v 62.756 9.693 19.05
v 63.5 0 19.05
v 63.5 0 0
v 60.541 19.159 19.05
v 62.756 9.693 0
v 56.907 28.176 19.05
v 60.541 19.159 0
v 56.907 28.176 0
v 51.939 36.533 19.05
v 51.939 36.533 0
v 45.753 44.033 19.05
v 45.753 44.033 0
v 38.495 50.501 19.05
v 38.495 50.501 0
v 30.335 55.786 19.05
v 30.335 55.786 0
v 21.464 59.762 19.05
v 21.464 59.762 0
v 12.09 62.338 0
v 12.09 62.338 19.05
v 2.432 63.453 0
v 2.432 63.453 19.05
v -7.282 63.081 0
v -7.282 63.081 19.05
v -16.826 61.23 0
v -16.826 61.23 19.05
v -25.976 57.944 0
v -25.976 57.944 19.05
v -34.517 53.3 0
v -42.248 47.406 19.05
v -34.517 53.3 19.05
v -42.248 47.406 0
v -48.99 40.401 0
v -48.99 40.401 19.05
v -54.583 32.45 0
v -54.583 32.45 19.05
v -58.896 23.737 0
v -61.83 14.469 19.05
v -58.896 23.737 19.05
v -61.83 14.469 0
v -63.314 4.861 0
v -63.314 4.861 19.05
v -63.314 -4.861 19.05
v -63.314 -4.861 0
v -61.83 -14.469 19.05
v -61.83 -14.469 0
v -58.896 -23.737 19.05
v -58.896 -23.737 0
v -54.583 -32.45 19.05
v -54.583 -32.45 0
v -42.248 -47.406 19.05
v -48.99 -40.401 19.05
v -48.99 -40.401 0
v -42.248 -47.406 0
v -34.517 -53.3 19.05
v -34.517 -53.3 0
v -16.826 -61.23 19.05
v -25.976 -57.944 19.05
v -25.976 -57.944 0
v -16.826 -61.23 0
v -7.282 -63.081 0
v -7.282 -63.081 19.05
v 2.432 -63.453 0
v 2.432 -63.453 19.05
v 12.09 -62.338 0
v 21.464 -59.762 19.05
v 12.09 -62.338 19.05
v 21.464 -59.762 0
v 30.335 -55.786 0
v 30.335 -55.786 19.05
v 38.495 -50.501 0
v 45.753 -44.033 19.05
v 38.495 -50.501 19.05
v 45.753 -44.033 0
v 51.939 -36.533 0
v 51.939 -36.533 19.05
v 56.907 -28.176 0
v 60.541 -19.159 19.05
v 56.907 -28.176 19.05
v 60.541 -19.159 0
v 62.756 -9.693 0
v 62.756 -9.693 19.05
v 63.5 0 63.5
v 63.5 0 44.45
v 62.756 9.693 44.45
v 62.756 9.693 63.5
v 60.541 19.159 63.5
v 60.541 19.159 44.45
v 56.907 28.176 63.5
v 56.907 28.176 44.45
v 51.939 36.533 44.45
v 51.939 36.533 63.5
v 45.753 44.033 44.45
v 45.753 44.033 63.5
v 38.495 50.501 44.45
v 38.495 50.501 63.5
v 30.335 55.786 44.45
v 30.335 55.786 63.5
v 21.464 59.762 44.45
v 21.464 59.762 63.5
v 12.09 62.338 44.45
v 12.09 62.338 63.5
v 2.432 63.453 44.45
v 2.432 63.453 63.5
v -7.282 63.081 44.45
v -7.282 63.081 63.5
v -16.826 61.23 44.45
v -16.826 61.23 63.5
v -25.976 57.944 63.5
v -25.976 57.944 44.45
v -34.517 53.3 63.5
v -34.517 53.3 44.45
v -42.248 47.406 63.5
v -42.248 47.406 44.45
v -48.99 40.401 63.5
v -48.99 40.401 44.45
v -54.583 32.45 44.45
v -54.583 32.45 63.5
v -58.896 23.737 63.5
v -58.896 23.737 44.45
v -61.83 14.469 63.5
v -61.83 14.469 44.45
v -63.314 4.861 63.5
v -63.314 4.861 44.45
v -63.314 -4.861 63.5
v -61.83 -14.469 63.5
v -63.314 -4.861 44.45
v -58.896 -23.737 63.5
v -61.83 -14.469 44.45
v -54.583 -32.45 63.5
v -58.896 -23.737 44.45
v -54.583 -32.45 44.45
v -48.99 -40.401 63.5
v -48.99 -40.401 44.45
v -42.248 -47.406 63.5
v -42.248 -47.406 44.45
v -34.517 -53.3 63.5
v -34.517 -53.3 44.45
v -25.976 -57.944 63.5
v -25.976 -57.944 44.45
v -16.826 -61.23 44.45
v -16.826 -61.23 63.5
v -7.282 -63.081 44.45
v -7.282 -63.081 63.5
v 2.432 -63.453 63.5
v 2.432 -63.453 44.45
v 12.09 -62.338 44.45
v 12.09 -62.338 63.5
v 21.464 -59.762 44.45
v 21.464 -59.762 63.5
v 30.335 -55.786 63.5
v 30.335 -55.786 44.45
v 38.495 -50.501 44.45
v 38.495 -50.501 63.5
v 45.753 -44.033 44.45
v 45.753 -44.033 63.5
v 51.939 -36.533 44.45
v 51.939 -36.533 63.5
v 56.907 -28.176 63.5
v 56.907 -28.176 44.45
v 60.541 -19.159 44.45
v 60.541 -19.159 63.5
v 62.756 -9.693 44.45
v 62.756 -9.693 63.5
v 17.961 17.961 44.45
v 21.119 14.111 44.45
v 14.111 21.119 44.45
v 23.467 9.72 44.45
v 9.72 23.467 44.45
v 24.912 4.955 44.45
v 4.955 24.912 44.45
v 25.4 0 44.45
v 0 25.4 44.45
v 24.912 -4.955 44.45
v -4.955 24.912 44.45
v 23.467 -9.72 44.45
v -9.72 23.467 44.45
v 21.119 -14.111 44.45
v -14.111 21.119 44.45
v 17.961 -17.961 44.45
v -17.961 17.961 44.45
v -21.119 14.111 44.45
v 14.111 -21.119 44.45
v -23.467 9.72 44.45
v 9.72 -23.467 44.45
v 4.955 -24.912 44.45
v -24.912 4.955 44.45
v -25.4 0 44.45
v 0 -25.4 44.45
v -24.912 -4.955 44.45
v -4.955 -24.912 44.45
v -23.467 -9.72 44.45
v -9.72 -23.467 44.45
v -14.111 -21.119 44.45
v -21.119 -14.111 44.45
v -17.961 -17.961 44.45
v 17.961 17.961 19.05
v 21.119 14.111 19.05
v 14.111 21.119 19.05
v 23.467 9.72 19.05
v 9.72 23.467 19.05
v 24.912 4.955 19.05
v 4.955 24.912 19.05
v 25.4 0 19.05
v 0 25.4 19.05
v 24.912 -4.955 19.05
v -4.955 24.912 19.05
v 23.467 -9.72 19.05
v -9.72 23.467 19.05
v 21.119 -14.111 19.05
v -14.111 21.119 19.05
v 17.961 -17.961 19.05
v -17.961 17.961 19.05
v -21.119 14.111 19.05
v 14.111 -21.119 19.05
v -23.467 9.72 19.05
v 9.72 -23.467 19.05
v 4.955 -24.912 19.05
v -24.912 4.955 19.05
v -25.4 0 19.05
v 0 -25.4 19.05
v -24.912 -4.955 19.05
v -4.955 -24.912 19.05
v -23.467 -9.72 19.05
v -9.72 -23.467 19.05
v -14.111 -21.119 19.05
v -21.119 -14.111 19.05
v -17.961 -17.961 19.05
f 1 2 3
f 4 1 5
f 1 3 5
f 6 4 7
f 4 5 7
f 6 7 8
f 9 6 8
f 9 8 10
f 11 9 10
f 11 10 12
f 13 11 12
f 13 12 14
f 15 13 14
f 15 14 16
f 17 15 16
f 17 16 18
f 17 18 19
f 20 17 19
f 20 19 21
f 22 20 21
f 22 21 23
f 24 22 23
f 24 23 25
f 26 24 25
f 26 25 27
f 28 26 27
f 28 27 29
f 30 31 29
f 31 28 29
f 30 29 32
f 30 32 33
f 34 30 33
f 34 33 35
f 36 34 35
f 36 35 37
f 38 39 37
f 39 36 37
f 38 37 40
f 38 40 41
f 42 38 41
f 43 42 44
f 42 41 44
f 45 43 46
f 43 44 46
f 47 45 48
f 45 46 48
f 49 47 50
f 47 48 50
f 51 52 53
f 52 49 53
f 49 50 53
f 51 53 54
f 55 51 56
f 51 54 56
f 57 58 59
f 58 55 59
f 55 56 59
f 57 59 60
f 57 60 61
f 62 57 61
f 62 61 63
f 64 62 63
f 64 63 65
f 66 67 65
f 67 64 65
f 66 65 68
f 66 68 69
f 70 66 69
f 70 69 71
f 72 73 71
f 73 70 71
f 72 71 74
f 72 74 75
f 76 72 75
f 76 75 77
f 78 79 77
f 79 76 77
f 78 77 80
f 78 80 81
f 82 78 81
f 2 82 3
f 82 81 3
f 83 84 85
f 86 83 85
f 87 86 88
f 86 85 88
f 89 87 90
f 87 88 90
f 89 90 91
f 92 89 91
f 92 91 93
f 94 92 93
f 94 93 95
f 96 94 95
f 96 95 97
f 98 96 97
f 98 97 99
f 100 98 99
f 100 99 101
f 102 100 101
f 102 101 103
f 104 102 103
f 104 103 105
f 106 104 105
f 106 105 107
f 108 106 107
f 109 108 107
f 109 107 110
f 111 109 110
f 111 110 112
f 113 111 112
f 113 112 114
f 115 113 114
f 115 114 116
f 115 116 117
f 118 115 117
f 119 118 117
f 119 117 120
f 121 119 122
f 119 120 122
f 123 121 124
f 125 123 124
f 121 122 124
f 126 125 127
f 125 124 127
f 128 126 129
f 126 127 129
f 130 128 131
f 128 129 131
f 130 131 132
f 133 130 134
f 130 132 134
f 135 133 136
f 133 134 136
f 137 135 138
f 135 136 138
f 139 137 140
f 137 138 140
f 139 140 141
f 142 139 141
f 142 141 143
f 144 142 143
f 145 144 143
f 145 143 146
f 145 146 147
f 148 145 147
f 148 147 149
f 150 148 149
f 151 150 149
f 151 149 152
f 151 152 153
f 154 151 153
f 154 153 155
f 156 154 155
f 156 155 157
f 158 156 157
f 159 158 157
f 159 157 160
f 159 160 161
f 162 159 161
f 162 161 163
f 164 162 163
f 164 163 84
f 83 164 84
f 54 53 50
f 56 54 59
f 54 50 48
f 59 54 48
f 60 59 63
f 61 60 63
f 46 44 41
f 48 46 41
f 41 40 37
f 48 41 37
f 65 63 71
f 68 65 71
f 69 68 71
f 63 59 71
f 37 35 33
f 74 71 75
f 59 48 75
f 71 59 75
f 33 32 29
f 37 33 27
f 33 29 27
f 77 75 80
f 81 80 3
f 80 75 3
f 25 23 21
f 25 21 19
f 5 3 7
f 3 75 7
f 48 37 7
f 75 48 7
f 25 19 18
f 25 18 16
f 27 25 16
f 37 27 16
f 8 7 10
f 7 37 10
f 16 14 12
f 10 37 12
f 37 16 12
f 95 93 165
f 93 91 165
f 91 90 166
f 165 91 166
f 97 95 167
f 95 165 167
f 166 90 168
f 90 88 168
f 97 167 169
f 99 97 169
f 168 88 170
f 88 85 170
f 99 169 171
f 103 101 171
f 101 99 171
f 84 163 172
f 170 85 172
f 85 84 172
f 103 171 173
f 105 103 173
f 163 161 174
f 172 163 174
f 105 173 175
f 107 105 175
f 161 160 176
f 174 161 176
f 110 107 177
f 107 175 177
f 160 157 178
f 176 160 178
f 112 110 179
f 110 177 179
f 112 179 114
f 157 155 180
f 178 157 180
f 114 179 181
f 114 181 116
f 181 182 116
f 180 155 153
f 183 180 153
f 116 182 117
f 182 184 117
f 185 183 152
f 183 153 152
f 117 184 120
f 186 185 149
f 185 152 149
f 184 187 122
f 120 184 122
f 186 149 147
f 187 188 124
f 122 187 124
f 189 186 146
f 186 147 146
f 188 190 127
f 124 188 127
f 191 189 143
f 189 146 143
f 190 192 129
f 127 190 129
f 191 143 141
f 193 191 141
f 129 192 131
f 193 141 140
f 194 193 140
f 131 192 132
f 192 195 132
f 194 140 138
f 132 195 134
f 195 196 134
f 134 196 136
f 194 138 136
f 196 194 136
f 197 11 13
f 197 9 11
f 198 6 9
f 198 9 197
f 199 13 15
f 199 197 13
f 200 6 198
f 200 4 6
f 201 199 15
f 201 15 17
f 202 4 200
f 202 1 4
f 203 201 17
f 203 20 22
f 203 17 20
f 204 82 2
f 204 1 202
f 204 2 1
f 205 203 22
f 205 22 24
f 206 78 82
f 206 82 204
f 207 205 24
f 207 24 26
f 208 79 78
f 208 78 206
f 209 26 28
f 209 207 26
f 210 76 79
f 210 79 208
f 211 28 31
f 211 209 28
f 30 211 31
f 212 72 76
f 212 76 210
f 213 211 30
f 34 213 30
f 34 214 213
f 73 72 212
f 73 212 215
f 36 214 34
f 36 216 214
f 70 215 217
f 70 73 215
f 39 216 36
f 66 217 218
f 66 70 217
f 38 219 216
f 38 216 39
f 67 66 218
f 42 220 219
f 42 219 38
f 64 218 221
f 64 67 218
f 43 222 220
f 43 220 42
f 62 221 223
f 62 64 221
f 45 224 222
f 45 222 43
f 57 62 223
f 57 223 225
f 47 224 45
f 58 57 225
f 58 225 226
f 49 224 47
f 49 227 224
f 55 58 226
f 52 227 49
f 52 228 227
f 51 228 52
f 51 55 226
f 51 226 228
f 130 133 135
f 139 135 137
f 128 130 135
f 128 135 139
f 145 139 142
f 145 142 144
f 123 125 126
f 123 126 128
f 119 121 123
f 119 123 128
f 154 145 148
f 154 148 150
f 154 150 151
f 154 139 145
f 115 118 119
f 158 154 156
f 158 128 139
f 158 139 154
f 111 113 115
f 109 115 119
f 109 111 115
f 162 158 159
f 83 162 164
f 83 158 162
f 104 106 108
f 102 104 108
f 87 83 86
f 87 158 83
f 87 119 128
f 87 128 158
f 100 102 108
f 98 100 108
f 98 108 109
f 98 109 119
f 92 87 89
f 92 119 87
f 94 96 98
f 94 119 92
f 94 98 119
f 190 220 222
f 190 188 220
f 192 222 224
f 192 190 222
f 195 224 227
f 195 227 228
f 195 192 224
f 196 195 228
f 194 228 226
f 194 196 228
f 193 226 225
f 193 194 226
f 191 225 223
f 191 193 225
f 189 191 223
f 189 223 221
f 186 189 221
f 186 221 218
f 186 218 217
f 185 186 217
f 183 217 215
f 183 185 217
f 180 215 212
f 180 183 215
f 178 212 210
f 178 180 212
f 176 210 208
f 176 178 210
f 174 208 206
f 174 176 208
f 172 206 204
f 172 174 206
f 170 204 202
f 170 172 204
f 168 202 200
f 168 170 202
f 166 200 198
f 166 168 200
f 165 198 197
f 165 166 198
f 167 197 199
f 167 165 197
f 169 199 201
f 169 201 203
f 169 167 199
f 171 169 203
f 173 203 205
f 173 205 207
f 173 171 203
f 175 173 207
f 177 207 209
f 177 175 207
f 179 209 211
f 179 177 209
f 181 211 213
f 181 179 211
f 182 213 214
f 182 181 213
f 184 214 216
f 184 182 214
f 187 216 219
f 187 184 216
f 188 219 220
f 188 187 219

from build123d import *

# Parameters (mm, degrees)
F0_R     = 63.5
F1_DEPTH = 63.5
F2_W     = 38.1
F2_H     = 25.4


with BuildPart() as f1:
    # F0 (on Top) → F1 (new body)
    with BuildSketch(Plane.XY):
        Circle(F0_R)
    extrude(amount=F1_DEPTH)

    # F2 (on Front) → F3 (revolve, cut)
    with BuildSketch(Plane.XZ):
        with Locations((-44.45, 31.75)):
            Rectangle(F2_W, F2_H)
    revolve(axis=Axis((0, 0, 31.75), (0, 0, 1)), mode=Mode.SUBTRACT)


solid = f1.part
